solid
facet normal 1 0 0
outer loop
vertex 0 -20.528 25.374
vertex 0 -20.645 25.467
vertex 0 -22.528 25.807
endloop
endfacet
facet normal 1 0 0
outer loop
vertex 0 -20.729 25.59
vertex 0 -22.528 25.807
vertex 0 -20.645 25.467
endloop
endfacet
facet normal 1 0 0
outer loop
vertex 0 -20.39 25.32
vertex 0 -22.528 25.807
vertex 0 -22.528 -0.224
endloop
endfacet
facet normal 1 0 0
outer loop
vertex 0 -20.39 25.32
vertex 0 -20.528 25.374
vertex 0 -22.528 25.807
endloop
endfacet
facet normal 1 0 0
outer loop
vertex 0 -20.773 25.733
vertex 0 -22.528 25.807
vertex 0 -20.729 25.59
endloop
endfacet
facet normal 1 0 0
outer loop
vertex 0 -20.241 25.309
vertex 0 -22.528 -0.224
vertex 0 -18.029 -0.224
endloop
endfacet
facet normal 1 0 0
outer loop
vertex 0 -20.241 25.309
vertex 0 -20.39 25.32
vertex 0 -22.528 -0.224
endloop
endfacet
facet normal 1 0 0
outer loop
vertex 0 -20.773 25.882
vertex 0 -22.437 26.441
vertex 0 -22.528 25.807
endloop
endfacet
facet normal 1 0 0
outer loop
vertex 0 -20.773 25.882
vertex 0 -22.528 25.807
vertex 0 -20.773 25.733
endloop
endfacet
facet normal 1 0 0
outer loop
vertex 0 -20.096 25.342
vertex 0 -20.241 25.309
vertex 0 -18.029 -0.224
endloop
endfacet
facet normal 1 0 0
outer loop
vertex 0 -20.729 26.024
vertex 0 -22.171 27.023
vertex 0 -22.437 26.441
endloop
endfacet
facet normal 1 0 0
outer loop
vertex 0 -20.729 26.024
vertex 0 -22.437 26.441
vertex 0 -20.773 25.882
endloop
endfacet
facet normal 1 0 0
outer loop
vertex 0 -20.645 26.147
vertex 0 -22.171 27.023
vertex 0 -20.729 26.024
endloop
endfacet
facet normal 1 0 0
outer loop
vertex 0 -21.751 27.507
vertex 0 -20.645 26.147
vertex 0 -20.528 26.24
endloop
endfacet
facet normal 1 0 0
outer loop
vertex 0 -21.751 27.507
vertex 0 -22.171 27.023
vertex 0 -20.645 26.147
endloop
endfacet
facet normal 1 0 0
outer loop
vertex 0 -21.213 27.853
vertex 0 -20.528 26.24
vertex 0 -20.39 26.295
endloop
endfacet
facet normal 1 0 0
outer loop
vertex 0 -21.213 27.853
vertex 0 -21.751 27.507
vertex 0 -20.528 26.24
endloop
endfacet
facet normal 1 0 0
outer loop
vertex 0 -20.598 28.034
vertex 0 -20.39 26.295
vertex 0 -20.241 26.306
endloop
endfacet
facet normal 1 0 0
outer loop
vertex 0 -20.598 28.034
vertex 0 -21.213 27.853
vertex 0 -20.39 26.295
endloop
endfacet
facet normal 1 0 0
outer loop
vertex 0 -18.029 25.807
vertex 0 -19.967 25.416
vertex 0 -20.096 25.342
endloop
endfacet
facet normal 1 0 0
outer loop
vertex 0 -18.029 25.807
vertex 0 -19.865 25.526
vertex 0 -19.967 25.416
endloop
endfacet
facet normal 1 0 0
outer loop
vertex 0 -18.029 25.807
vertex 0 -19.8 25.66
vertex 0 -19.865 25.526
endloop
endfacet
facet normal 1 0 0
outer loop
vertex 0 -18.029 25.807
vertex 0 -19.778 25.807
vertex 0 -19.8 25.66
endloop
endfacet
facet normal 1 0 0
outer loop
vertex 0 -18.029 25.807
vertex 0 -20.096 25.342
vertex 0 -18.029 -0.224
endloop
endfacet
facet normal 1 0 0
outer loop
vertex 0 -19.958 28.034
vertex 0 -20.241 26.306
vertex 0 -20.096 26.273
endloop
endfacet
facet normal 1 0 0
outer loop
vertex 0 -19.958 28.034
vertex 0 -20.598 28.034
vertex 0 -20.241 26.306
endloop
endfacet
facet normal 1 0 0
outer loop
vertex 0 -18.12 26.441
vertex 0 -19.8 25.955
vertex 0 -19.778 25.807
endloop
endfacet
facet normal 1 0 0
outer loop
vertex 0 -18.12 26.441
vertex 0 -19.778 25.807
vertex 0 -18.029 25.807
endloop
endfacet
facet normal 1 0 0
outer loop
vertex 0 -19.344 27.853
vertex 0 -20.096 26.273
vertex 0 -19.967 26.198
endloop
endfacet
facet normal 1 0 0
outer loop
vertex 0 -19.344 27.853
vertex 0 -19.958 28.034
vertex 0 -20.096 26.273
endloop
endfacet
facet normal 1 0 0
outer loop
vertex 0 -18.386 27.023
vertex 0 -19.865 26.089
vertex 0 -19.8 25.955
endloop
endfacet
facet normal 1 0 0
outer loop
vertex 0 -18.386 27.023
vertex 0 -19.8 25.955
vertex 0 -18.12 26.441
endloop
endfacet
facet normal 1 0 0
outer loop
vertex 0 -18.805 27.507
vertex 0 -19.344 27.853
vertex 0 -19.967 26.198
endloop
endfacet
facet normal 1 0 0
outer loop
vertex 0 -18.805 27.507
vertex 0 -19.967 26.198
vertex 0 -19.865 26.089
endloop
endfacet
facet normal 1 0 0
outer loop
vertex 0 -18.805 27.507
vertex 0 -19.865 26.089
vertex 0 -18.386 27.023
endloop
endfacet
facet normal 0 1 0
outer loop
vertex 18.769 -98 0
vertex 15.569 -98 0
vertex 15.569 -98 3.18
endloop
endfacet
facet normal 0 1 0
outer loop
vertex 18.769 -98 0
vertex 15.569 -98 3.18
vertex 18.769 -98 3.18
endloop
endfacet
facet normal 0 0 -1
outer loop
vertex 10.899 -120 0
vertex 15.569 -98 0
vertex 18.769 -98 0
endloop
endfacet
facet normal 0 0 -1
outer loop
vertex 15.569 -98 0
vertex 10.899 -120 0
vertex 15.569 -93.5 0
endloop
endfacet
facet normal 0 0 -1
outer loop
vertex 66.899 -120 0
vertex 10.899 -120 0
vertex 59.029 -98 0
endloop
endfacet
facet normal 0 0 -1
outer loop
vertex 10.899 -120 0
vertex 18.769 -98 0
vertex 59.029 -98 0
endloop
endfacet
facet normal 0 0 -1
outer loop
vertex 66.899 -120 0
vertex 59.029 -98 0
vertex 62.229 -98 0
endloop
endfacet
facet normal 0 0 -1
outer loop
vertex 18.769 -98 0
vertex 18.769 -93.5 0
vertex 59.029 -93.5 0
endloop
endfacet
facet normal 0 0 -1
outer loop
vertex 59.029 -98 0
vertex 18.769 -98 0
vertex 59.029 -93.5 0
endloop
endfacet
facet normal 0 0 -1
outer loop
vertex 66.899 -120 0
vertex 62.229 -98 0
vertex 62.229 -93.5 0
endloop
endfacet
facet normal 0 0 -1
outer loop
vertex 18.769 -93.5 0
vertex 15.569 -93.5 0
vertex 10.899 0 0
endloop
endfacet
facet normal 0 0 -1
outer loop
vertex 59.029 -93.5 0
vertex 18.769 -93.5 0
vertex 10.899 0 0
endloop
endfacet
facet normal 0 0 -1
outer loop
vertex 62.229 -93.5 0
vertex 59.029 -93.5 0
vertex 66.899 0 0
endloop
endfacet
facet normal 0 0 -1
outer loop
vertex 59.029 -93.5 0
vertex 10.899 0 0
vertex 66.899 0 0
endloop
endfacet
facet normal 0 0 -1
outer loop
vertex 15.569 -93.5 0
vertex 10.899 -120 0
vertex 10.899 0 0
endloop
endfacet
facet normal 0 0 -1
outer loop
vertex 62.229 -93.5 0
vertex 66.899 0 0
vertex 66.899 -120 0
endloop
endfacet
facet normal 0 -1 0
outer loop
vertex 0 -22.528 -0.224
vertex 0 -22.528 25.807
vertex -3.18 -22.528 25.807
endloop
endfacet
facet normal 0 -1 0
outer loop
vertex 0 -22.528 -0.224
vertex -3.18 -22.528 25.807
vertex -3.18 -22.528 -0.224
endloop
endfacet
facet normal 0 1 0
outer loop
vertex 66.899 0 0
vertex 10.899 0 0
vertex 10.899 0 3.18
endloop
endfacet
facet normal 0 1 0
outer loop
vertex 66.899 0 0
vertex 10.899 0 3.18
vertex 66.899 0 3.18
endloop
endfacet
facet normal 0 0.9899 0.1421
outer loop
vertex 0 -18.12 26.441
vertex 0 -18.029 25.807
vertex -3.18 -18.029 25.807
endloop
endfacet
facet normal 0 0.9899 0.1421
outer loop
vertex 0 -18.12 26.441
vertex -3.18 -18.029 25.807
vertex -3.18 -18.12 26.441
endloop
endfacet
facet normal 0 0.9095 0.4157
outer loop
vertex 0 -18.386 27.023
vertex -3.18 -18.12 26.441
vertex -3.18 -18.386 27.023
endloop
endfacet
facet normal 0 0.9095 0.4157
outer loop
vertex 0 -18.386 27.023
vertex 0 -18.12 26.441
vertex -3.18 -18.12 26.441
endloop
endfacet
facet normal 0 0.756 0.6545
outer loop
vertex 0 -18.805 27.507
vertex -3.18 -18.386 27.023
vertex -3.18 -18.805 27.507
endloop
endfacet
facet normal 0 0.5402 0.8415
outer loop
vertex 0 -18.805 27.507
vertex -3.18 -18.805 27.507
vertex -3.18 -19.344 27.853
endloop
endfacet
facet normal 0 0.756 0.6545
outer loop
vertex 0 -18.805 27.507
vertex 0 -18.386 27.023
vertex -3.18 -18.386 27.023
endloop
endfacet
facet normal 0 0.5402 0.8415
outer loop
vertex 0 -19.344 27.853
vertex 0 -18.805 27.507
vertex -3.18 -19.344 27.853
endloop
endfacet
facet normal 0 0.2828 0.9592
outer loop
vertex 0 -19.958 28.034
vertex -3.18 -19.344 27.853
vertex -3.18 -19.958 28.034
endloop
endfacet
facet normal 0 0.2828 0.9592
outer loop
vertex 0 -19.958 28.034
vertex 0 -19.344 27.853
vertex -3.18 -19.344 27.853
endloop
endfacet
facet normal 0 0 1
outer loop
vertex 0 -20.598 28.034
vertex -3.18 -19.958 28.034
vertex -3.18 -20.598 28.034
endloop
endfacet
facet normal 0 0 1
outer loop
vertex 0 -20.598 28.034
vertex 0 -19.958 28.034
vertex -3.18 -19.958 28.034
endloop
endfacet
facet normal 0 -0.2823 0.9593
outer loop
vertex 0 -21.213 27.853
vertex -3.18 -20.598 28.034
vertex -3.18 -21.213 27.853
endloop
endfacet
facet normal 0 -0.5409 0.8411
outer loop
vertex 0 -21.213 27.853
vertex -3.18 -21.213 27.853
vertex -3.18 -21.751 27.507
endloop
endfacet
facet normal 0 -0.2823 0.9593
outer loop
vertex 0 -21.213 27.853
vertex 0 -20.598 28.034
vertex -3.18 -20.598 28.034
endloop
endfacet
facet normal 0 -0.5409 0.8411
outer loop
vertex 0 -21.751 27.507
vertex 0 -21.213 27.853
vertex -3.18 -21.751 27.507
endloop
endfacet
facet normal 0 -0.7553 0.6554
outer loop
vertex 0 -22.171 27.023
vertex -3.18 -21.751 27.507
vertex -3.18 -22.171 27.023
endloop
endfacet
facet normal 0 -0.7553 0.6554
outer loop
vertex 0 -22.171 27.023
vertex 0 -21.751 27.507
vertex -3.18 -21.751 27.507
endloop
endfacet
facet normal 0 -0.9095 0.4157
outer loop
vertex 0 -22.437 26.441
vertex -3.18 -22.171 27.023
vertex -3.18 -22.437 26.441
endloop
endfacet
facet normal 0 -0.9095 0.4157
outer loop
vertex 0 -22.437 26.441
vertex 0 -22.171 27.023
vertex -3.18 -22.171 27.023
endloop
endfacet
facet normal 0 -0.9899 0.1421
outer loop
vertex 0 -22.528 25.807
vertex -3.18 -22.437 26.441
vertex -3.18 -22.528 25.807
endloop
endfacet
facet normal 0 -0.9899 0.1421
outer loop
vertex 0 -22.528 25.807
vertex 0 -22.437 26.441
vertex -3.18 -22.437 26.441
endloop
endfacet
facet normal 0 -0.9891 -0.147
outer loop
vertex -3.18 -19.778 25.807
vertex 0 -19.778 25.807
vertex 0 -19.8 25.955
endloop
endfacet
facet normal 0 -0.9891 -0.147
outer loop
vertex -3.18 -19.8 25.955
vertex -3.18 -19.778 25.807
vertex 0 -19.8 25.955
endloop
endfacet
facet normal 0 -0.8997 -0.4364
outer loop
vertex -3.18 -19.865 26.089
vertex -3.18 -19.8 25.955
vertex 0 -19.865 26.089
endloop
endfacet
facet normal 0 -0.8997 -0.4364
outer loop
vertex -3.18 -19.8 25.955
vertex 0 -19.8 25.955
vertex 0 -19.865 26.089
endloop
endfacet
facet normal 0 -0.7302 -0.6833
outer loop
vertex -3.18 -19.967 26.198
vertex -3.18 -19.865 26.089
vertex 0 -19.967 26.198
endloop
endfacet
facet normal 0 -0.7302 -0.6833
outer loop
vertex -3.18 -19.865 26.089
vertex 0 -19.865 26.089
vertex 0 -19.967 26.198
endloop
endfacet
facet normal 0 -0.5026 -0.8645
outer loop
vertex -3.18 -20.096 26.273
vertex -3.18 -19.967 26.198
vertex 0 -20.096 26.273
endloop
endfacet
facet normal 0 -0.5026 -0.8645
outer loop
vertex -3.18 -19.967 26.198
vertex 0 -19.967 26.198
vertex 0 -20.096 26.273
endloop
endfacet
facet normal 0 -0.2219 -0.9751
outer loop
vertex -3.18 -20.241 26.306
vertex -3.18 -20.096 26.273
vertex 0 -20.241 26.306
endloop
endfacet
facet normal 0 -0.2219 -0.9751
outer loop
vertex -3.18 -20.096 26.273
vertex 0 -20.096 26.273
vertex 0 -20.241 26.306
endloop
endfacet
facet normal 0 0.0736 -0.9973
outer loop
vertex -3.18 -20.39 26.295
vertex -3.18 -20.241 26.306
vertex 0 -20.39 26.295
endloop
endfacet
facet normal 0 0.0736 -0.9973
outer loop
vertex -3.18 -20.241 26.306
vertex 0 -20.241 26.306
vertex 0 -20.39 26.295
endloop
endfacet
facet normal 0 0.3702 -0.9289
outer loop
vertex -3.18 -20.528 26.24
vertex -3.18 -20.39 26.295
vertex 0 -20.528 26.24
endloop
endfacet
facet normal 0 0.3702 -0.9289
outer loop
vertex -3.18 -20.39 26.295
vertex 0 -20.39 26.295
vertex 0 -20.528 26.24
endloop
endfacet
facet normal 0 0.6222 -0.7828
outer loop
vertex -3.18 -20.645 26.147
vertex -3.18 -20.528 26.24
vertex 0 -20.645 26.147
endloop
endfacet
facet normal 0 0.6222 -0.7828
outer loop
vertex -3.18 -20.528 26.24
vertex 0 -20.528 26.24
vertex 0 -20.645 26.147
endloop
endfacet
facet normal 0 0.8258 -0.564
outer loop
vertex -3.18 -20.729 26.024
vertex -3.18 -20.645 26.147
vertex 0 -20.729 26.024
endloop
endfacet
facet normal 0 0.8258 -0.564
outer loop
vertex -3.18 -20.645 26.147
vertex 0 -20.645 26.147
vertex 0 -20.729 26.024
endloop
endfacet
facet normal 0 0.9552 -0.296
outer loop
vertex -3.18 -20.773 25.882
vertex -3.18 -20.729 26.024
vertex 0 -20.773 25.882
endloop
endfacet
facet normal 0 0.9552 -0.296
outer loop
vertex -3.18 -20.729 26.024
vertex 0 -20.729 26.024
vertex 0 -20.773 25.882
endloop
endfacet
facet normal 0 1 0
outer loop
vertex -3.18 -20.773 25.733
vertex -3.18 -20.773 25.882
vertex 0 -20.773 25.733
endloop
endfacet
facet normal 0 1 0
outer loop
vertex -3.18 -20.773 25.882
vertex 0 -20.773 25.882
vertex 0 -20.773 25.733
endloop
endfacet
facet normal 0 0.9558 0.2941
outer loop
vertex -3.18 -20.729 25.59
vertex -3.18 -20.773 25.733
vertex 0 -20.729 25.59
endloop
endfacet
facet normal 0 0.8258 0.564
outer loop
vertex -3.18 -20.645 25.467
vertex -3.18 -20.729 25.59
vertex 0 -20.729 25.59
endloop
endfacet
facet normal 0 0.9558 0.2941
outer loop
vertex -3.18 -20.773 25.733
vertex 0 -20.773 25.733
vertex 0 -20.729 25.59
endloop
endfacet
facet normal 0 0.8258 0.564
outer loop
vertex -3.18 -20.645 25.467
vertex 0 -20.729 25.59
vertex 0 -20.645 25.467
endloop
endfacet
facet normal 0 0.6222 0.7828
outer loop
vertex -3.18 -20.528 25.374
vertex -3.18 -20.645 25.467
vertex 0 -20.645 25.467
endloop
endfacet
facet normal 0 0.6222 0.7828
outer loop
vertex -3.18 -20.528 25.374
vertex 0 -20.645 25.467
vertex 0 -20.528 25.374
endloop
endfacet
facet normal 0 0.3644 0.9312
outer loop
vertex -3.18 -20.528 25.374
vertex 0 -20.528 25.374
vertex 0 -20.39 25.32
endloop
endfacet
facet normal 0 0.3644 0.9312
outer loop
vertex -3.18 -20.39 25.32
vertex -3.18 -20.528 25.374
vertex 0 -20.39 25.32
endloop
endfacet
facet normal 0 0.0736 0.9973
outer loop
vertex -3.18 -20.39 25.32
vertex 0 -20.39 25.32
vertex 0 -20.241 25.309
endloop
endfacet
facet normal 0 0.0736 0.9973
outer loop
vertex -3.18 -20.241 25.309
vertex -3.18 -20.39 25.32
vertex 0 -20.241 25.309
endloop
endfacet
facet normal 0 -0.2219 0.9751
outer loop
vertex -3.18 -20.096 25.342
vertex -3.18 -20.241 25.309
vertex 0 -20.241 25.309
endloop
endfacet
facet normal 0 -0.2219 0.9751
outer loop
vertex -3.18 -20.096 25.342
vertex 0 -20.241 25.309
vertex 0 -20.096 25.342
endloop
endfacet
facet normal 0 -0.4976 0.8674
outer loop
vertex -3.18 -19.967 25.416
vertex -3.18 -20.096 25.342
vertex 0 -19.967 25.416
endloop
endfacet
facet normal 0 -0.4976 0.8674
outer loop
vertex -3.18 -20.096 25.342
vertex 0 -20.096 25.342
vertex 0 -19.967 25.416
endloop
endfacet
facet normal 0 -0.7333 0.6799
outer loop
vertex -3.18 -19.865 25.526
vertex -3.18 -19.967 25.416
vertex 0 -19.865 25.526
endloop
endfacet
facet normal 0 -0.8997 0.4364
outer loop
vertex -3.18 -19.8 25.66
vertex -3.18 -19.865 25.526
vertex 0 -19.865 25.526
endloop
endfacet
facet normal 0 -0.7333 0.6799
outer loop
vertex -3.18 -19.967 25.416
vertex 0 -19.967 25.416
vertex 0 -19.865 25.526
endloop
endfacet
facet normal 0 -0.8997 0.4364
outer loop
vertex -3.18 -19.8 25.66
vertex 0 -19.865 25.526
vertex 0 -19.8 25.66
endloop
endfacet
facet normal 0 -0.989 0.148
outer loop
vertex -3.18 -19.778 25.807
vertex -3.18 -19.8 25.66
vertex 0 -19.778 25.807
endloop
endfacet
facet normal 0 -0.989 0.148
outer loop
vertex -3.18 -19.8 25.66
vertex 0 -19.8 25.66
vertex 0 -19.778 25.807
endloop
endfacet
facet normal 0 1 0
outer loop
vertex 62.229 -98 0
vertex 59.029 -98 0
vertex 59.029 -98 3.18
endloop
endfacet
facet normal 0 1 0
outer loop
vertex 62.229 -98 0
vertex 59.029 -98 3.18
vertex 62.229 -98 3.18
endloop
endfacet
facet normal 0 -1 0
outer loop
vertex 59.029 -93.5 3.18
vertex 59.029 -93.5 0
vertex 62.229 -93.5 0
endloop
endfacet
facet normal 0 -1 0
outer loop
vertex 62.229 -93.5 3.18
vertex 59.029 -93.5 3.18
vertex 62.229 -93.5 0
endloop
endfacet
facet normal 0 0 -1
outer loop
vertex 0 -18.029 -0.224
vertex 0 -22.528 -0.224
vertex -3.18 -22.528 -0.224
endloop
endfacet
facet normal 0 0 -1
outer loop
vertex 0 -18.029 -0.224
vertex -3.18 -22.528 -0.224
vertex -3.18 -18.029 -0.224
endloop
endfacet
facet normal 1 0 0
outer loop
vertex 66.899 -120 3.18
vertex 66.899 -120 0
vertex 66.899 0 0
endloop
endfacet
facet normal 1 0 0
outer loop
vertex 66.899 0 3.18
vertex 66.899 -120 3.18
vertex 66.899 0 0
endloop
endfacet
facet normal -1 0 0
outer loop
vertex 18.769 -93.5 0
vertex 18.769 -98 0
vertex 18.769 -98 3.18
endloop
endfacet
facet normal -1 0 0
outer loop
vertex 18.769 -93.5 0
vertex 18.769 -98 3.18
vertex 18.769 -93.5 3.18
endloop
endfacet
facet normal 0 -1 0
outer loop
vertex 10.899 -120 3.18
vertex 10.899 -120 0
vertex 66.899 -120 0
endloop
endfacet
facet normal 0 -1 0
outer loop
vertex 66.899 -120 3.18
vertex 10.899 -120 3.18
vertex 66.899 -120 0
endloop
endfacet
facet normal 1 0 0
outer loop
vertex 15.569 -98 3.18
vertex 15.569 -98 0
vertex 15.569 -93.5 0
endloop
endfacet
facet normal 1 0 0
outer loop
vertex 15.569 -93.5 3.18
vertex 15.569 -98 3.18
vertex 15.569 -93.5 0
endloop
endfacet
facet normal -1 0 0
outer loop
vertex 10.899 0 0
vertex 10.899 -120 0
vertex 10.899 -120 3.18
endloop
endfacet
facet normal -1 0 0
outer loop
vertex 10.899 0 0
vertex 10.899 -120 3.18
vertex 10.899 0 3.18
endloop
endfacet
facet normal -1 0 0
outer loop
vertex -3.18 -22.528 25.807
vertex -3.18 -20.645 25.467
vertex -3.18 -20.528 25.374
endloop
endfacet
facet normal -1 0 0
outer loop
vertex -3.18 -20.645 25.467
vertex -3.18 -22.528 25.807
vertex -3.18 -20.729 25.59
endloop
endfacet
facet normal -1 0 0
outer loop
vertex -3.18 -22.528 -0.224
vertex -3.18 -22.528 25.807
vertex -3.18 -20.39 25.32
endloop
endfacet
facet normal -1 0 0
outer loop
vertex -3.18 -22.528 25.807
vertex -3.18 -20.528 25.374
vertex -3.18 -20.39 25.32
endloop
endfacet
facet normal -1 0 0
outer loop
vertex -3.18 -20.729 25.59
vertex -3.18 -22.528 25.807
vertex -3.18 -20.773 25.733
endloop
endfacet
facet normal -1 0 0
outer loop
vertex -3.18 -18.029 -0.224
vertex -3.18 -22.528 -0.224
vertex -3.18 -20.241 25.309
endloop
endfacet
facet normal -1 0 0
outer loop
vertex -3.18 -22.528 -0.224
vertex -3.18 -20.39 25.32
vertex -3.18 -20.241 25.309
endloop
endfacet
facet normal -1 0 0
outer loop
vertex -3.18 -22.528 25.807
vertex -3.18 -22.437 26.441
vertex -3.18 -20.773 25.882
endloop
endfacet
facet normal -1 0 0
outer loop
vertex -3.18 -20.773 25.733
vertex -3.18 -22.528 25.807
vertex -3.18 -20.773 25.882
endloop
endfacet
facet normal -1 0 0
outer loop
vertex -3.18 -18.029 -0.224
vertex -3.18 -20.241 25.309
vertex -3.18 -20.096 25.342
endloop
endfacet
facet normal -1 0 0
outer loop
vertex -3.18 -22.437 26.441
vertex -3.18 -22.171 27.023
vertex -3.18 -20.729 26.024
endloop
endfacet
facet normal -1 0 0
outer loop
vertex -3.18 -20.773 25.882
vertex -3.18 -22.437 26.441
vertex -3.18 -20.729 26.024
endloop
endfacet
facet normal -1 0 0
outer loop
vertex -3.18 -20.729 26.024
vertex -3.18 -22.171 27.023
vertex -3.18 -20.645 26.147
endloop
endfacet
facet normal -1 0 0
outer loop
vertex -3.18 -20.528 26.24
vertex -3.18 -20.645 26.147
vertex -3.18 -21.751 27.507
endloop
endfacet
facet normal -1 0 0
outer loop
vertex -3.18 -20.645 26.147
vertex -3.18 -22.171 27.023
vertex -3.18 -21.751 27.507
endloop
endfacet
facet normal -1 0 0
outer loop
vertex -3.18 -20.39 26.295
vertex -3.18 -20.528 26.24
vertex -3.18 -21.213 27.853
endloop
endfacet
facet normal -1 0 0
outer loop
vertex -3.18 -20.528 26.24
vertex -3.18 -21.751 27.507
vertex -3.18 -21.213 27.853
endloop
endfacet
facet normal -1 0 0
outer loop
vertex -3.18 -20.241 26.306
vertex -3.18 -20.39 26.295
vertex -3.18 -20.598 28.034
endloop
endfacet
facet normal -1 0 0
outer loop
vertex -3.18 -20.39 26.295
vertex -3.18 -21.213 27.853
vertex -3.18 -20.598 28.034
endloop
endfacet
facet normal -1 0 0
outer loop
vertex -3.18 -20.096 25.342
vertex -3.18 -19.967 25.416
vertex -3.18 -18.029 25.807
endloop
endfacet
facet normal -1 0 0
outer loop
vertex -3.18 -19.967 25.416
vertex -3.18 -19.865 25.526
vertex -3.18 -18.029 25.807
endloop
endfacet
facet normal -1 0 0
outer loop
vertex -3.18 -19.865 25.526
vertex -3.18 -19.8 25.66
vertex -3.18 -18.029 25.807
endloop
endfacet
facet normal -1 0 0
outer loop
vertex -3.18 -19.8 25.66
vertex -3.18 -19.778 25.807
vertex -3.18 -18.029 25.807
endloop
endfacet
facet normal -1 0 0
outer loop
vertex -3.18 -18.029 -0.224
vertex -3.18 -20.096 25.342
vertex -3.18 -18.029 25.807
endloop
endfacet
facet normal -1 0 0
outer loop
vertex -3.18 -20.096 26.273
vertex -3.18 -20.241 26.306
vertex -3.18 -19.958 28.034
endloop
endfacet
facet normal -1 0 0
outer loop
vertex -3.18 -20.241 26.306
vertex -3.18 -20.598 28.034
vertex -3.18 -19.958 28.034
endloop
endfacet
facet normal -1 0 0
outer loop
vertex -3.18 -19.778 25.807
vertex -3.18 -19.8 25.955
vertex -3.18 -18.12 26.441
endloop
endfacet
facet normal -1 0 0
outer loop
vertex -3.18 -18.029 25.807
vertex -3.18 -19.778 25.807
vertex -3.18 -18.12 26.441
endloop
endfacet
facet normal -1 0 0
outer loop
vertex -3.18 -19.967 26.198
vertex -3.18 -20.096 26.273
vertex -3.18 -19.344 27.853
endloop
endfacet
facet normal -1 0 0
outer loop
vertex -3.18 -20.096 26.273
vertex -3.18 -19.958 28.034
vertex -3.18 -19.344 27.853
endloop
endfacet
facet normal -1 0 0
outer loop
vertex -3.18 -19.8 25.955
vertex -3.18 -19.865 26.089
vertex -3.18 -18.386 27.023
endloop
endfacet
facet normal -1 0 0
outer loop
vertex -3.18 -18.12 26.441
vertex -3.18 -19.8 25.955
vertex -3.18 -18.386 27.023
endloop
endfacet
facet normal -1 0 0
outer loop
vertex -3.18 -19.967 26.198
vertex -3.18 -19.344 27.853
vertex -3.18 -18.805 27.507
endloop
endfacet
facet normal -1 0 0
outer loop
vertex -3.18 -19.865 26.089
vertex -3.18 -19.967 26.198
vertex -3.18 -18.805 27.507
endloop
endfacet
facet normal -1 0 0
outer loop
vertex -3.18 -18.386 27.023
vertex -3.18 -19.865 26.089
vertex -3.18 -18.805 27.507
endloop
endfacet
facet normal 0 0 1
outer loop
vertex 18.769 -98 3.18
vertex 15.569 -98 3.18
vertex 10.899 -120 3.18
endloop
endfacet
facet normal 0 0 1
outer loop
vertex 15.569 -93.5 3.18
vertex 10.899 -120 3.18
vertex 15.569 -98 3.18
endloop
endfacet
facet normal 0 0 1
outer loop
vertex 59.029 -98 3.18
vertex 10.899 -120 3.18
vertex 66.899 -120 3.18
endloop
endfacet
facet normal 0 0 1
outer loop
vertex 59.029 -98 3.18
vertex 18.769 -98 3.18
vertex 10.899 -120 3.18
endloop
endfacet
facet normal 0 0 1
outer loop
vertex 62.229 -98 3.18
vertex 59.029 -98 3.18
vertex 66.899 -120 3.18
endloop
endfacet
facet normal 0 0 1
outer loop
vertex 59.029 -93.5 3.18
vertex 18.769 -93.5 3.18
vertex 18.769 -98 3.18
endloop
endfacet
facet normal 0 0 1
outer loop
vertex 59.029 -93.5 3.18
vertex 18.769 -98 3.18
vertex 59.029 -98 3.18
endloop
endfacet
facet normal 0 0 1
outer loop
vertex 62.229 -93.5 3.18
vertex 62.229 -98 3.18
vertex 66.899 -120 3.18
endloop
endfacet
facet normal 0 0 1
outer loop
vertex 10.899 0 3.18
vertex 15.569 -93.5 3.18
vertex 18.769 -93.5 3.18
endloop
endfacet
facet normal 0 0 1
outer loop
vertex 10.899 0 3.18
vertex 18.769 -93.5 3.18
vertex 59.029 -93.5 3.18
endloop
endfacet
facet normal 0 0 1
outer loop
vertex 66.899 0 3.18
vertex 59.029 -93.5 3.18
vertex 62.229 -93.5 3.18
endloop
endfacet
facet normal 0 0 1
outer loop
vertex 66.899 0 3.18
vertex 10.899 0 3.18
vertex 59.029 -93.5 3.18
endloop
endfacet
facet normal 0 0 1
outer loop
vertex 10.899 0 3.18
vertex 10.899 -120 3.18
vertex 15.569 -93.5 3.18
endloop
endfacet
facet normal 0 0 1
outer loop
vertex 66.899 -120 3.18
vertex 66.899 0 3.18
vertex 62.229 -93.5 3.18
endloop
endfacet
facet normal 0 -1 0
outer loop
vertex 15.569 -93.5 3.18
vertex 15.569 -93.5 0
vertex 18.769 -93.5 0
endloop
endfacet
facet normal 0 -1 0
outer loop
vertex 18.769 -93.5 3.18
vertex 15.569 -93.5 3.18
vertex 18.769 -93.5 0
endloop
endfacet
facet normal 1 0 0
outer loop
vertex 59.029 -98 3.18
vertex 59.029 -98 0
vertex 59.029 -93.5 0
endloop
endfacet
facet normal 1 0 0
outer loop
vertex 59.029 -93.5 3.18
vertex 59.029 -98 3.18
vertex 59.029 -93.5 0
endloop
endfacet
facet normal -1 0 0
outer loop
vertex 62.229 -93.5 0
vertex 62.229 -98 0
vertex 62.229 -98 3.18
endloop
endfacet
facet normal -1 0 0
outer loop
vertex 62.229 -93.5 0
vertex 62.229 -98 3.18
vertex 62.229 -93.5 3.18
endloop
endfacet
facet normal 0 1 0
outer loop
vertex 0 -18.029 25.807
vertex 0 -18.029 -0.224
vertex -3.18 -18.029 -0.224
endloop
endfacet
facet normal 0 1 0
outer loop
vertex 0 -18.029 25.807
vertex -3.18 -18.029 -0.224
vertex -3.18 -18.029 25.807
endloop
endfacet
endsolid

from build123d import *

# Parameters (mm, degrees)
F0_R     = 0.5
F1_DEPTH = 3.18
F2_W     = 56
F2_H     = 120
F2_W_2   = 3.2
F2_H_2   = 4.5
F3_DEPTH = 3.18


with BuildPart() as f1:
    # F0 (on Right) → F1 (new body)
    with BuildSketch(Plane.YZ):
        with BuildLine():
            Line((-22.527829, 25.80721), (-22.527829, -0.223886))
            Line((-22.527829, -0.223886), (-18.028684, -0.223886))
            Line((-18.028684, -0.223886), (-18.028684, 25.80721))
            ThreePointArc((-18.028684, 25.80721), (-20.278256, 28.056783), (-22.527829, 25.80721))
        make_face()
        with Locations((-20.278256, 25.80721)):
            Circle(F0_R, mode=Mode.SUBTRACT)
    extrude(amount=-F1_DEPTH)


with BuildPart() as f3:
    # F2 (on Top) → F3 (new body)
    with BuildSketch(Plane.XY):
        with Locations((38.899257, -60)):
            Rectangle(F2_W, F2_H)
        with Locations((17.169257, -95.75)):
            Rectangle(F2_W_2, F2_H_2, mode=Mode.SUBTRACT)
        with Locations((60.629257, -95.75)):
            Rectangle(F2_W_2, F2_H_2, mode=Mode.SUBTRACT)
    extrude(amount=F3_DEPTH)


solid = Compound([f1.part, f3.part])
